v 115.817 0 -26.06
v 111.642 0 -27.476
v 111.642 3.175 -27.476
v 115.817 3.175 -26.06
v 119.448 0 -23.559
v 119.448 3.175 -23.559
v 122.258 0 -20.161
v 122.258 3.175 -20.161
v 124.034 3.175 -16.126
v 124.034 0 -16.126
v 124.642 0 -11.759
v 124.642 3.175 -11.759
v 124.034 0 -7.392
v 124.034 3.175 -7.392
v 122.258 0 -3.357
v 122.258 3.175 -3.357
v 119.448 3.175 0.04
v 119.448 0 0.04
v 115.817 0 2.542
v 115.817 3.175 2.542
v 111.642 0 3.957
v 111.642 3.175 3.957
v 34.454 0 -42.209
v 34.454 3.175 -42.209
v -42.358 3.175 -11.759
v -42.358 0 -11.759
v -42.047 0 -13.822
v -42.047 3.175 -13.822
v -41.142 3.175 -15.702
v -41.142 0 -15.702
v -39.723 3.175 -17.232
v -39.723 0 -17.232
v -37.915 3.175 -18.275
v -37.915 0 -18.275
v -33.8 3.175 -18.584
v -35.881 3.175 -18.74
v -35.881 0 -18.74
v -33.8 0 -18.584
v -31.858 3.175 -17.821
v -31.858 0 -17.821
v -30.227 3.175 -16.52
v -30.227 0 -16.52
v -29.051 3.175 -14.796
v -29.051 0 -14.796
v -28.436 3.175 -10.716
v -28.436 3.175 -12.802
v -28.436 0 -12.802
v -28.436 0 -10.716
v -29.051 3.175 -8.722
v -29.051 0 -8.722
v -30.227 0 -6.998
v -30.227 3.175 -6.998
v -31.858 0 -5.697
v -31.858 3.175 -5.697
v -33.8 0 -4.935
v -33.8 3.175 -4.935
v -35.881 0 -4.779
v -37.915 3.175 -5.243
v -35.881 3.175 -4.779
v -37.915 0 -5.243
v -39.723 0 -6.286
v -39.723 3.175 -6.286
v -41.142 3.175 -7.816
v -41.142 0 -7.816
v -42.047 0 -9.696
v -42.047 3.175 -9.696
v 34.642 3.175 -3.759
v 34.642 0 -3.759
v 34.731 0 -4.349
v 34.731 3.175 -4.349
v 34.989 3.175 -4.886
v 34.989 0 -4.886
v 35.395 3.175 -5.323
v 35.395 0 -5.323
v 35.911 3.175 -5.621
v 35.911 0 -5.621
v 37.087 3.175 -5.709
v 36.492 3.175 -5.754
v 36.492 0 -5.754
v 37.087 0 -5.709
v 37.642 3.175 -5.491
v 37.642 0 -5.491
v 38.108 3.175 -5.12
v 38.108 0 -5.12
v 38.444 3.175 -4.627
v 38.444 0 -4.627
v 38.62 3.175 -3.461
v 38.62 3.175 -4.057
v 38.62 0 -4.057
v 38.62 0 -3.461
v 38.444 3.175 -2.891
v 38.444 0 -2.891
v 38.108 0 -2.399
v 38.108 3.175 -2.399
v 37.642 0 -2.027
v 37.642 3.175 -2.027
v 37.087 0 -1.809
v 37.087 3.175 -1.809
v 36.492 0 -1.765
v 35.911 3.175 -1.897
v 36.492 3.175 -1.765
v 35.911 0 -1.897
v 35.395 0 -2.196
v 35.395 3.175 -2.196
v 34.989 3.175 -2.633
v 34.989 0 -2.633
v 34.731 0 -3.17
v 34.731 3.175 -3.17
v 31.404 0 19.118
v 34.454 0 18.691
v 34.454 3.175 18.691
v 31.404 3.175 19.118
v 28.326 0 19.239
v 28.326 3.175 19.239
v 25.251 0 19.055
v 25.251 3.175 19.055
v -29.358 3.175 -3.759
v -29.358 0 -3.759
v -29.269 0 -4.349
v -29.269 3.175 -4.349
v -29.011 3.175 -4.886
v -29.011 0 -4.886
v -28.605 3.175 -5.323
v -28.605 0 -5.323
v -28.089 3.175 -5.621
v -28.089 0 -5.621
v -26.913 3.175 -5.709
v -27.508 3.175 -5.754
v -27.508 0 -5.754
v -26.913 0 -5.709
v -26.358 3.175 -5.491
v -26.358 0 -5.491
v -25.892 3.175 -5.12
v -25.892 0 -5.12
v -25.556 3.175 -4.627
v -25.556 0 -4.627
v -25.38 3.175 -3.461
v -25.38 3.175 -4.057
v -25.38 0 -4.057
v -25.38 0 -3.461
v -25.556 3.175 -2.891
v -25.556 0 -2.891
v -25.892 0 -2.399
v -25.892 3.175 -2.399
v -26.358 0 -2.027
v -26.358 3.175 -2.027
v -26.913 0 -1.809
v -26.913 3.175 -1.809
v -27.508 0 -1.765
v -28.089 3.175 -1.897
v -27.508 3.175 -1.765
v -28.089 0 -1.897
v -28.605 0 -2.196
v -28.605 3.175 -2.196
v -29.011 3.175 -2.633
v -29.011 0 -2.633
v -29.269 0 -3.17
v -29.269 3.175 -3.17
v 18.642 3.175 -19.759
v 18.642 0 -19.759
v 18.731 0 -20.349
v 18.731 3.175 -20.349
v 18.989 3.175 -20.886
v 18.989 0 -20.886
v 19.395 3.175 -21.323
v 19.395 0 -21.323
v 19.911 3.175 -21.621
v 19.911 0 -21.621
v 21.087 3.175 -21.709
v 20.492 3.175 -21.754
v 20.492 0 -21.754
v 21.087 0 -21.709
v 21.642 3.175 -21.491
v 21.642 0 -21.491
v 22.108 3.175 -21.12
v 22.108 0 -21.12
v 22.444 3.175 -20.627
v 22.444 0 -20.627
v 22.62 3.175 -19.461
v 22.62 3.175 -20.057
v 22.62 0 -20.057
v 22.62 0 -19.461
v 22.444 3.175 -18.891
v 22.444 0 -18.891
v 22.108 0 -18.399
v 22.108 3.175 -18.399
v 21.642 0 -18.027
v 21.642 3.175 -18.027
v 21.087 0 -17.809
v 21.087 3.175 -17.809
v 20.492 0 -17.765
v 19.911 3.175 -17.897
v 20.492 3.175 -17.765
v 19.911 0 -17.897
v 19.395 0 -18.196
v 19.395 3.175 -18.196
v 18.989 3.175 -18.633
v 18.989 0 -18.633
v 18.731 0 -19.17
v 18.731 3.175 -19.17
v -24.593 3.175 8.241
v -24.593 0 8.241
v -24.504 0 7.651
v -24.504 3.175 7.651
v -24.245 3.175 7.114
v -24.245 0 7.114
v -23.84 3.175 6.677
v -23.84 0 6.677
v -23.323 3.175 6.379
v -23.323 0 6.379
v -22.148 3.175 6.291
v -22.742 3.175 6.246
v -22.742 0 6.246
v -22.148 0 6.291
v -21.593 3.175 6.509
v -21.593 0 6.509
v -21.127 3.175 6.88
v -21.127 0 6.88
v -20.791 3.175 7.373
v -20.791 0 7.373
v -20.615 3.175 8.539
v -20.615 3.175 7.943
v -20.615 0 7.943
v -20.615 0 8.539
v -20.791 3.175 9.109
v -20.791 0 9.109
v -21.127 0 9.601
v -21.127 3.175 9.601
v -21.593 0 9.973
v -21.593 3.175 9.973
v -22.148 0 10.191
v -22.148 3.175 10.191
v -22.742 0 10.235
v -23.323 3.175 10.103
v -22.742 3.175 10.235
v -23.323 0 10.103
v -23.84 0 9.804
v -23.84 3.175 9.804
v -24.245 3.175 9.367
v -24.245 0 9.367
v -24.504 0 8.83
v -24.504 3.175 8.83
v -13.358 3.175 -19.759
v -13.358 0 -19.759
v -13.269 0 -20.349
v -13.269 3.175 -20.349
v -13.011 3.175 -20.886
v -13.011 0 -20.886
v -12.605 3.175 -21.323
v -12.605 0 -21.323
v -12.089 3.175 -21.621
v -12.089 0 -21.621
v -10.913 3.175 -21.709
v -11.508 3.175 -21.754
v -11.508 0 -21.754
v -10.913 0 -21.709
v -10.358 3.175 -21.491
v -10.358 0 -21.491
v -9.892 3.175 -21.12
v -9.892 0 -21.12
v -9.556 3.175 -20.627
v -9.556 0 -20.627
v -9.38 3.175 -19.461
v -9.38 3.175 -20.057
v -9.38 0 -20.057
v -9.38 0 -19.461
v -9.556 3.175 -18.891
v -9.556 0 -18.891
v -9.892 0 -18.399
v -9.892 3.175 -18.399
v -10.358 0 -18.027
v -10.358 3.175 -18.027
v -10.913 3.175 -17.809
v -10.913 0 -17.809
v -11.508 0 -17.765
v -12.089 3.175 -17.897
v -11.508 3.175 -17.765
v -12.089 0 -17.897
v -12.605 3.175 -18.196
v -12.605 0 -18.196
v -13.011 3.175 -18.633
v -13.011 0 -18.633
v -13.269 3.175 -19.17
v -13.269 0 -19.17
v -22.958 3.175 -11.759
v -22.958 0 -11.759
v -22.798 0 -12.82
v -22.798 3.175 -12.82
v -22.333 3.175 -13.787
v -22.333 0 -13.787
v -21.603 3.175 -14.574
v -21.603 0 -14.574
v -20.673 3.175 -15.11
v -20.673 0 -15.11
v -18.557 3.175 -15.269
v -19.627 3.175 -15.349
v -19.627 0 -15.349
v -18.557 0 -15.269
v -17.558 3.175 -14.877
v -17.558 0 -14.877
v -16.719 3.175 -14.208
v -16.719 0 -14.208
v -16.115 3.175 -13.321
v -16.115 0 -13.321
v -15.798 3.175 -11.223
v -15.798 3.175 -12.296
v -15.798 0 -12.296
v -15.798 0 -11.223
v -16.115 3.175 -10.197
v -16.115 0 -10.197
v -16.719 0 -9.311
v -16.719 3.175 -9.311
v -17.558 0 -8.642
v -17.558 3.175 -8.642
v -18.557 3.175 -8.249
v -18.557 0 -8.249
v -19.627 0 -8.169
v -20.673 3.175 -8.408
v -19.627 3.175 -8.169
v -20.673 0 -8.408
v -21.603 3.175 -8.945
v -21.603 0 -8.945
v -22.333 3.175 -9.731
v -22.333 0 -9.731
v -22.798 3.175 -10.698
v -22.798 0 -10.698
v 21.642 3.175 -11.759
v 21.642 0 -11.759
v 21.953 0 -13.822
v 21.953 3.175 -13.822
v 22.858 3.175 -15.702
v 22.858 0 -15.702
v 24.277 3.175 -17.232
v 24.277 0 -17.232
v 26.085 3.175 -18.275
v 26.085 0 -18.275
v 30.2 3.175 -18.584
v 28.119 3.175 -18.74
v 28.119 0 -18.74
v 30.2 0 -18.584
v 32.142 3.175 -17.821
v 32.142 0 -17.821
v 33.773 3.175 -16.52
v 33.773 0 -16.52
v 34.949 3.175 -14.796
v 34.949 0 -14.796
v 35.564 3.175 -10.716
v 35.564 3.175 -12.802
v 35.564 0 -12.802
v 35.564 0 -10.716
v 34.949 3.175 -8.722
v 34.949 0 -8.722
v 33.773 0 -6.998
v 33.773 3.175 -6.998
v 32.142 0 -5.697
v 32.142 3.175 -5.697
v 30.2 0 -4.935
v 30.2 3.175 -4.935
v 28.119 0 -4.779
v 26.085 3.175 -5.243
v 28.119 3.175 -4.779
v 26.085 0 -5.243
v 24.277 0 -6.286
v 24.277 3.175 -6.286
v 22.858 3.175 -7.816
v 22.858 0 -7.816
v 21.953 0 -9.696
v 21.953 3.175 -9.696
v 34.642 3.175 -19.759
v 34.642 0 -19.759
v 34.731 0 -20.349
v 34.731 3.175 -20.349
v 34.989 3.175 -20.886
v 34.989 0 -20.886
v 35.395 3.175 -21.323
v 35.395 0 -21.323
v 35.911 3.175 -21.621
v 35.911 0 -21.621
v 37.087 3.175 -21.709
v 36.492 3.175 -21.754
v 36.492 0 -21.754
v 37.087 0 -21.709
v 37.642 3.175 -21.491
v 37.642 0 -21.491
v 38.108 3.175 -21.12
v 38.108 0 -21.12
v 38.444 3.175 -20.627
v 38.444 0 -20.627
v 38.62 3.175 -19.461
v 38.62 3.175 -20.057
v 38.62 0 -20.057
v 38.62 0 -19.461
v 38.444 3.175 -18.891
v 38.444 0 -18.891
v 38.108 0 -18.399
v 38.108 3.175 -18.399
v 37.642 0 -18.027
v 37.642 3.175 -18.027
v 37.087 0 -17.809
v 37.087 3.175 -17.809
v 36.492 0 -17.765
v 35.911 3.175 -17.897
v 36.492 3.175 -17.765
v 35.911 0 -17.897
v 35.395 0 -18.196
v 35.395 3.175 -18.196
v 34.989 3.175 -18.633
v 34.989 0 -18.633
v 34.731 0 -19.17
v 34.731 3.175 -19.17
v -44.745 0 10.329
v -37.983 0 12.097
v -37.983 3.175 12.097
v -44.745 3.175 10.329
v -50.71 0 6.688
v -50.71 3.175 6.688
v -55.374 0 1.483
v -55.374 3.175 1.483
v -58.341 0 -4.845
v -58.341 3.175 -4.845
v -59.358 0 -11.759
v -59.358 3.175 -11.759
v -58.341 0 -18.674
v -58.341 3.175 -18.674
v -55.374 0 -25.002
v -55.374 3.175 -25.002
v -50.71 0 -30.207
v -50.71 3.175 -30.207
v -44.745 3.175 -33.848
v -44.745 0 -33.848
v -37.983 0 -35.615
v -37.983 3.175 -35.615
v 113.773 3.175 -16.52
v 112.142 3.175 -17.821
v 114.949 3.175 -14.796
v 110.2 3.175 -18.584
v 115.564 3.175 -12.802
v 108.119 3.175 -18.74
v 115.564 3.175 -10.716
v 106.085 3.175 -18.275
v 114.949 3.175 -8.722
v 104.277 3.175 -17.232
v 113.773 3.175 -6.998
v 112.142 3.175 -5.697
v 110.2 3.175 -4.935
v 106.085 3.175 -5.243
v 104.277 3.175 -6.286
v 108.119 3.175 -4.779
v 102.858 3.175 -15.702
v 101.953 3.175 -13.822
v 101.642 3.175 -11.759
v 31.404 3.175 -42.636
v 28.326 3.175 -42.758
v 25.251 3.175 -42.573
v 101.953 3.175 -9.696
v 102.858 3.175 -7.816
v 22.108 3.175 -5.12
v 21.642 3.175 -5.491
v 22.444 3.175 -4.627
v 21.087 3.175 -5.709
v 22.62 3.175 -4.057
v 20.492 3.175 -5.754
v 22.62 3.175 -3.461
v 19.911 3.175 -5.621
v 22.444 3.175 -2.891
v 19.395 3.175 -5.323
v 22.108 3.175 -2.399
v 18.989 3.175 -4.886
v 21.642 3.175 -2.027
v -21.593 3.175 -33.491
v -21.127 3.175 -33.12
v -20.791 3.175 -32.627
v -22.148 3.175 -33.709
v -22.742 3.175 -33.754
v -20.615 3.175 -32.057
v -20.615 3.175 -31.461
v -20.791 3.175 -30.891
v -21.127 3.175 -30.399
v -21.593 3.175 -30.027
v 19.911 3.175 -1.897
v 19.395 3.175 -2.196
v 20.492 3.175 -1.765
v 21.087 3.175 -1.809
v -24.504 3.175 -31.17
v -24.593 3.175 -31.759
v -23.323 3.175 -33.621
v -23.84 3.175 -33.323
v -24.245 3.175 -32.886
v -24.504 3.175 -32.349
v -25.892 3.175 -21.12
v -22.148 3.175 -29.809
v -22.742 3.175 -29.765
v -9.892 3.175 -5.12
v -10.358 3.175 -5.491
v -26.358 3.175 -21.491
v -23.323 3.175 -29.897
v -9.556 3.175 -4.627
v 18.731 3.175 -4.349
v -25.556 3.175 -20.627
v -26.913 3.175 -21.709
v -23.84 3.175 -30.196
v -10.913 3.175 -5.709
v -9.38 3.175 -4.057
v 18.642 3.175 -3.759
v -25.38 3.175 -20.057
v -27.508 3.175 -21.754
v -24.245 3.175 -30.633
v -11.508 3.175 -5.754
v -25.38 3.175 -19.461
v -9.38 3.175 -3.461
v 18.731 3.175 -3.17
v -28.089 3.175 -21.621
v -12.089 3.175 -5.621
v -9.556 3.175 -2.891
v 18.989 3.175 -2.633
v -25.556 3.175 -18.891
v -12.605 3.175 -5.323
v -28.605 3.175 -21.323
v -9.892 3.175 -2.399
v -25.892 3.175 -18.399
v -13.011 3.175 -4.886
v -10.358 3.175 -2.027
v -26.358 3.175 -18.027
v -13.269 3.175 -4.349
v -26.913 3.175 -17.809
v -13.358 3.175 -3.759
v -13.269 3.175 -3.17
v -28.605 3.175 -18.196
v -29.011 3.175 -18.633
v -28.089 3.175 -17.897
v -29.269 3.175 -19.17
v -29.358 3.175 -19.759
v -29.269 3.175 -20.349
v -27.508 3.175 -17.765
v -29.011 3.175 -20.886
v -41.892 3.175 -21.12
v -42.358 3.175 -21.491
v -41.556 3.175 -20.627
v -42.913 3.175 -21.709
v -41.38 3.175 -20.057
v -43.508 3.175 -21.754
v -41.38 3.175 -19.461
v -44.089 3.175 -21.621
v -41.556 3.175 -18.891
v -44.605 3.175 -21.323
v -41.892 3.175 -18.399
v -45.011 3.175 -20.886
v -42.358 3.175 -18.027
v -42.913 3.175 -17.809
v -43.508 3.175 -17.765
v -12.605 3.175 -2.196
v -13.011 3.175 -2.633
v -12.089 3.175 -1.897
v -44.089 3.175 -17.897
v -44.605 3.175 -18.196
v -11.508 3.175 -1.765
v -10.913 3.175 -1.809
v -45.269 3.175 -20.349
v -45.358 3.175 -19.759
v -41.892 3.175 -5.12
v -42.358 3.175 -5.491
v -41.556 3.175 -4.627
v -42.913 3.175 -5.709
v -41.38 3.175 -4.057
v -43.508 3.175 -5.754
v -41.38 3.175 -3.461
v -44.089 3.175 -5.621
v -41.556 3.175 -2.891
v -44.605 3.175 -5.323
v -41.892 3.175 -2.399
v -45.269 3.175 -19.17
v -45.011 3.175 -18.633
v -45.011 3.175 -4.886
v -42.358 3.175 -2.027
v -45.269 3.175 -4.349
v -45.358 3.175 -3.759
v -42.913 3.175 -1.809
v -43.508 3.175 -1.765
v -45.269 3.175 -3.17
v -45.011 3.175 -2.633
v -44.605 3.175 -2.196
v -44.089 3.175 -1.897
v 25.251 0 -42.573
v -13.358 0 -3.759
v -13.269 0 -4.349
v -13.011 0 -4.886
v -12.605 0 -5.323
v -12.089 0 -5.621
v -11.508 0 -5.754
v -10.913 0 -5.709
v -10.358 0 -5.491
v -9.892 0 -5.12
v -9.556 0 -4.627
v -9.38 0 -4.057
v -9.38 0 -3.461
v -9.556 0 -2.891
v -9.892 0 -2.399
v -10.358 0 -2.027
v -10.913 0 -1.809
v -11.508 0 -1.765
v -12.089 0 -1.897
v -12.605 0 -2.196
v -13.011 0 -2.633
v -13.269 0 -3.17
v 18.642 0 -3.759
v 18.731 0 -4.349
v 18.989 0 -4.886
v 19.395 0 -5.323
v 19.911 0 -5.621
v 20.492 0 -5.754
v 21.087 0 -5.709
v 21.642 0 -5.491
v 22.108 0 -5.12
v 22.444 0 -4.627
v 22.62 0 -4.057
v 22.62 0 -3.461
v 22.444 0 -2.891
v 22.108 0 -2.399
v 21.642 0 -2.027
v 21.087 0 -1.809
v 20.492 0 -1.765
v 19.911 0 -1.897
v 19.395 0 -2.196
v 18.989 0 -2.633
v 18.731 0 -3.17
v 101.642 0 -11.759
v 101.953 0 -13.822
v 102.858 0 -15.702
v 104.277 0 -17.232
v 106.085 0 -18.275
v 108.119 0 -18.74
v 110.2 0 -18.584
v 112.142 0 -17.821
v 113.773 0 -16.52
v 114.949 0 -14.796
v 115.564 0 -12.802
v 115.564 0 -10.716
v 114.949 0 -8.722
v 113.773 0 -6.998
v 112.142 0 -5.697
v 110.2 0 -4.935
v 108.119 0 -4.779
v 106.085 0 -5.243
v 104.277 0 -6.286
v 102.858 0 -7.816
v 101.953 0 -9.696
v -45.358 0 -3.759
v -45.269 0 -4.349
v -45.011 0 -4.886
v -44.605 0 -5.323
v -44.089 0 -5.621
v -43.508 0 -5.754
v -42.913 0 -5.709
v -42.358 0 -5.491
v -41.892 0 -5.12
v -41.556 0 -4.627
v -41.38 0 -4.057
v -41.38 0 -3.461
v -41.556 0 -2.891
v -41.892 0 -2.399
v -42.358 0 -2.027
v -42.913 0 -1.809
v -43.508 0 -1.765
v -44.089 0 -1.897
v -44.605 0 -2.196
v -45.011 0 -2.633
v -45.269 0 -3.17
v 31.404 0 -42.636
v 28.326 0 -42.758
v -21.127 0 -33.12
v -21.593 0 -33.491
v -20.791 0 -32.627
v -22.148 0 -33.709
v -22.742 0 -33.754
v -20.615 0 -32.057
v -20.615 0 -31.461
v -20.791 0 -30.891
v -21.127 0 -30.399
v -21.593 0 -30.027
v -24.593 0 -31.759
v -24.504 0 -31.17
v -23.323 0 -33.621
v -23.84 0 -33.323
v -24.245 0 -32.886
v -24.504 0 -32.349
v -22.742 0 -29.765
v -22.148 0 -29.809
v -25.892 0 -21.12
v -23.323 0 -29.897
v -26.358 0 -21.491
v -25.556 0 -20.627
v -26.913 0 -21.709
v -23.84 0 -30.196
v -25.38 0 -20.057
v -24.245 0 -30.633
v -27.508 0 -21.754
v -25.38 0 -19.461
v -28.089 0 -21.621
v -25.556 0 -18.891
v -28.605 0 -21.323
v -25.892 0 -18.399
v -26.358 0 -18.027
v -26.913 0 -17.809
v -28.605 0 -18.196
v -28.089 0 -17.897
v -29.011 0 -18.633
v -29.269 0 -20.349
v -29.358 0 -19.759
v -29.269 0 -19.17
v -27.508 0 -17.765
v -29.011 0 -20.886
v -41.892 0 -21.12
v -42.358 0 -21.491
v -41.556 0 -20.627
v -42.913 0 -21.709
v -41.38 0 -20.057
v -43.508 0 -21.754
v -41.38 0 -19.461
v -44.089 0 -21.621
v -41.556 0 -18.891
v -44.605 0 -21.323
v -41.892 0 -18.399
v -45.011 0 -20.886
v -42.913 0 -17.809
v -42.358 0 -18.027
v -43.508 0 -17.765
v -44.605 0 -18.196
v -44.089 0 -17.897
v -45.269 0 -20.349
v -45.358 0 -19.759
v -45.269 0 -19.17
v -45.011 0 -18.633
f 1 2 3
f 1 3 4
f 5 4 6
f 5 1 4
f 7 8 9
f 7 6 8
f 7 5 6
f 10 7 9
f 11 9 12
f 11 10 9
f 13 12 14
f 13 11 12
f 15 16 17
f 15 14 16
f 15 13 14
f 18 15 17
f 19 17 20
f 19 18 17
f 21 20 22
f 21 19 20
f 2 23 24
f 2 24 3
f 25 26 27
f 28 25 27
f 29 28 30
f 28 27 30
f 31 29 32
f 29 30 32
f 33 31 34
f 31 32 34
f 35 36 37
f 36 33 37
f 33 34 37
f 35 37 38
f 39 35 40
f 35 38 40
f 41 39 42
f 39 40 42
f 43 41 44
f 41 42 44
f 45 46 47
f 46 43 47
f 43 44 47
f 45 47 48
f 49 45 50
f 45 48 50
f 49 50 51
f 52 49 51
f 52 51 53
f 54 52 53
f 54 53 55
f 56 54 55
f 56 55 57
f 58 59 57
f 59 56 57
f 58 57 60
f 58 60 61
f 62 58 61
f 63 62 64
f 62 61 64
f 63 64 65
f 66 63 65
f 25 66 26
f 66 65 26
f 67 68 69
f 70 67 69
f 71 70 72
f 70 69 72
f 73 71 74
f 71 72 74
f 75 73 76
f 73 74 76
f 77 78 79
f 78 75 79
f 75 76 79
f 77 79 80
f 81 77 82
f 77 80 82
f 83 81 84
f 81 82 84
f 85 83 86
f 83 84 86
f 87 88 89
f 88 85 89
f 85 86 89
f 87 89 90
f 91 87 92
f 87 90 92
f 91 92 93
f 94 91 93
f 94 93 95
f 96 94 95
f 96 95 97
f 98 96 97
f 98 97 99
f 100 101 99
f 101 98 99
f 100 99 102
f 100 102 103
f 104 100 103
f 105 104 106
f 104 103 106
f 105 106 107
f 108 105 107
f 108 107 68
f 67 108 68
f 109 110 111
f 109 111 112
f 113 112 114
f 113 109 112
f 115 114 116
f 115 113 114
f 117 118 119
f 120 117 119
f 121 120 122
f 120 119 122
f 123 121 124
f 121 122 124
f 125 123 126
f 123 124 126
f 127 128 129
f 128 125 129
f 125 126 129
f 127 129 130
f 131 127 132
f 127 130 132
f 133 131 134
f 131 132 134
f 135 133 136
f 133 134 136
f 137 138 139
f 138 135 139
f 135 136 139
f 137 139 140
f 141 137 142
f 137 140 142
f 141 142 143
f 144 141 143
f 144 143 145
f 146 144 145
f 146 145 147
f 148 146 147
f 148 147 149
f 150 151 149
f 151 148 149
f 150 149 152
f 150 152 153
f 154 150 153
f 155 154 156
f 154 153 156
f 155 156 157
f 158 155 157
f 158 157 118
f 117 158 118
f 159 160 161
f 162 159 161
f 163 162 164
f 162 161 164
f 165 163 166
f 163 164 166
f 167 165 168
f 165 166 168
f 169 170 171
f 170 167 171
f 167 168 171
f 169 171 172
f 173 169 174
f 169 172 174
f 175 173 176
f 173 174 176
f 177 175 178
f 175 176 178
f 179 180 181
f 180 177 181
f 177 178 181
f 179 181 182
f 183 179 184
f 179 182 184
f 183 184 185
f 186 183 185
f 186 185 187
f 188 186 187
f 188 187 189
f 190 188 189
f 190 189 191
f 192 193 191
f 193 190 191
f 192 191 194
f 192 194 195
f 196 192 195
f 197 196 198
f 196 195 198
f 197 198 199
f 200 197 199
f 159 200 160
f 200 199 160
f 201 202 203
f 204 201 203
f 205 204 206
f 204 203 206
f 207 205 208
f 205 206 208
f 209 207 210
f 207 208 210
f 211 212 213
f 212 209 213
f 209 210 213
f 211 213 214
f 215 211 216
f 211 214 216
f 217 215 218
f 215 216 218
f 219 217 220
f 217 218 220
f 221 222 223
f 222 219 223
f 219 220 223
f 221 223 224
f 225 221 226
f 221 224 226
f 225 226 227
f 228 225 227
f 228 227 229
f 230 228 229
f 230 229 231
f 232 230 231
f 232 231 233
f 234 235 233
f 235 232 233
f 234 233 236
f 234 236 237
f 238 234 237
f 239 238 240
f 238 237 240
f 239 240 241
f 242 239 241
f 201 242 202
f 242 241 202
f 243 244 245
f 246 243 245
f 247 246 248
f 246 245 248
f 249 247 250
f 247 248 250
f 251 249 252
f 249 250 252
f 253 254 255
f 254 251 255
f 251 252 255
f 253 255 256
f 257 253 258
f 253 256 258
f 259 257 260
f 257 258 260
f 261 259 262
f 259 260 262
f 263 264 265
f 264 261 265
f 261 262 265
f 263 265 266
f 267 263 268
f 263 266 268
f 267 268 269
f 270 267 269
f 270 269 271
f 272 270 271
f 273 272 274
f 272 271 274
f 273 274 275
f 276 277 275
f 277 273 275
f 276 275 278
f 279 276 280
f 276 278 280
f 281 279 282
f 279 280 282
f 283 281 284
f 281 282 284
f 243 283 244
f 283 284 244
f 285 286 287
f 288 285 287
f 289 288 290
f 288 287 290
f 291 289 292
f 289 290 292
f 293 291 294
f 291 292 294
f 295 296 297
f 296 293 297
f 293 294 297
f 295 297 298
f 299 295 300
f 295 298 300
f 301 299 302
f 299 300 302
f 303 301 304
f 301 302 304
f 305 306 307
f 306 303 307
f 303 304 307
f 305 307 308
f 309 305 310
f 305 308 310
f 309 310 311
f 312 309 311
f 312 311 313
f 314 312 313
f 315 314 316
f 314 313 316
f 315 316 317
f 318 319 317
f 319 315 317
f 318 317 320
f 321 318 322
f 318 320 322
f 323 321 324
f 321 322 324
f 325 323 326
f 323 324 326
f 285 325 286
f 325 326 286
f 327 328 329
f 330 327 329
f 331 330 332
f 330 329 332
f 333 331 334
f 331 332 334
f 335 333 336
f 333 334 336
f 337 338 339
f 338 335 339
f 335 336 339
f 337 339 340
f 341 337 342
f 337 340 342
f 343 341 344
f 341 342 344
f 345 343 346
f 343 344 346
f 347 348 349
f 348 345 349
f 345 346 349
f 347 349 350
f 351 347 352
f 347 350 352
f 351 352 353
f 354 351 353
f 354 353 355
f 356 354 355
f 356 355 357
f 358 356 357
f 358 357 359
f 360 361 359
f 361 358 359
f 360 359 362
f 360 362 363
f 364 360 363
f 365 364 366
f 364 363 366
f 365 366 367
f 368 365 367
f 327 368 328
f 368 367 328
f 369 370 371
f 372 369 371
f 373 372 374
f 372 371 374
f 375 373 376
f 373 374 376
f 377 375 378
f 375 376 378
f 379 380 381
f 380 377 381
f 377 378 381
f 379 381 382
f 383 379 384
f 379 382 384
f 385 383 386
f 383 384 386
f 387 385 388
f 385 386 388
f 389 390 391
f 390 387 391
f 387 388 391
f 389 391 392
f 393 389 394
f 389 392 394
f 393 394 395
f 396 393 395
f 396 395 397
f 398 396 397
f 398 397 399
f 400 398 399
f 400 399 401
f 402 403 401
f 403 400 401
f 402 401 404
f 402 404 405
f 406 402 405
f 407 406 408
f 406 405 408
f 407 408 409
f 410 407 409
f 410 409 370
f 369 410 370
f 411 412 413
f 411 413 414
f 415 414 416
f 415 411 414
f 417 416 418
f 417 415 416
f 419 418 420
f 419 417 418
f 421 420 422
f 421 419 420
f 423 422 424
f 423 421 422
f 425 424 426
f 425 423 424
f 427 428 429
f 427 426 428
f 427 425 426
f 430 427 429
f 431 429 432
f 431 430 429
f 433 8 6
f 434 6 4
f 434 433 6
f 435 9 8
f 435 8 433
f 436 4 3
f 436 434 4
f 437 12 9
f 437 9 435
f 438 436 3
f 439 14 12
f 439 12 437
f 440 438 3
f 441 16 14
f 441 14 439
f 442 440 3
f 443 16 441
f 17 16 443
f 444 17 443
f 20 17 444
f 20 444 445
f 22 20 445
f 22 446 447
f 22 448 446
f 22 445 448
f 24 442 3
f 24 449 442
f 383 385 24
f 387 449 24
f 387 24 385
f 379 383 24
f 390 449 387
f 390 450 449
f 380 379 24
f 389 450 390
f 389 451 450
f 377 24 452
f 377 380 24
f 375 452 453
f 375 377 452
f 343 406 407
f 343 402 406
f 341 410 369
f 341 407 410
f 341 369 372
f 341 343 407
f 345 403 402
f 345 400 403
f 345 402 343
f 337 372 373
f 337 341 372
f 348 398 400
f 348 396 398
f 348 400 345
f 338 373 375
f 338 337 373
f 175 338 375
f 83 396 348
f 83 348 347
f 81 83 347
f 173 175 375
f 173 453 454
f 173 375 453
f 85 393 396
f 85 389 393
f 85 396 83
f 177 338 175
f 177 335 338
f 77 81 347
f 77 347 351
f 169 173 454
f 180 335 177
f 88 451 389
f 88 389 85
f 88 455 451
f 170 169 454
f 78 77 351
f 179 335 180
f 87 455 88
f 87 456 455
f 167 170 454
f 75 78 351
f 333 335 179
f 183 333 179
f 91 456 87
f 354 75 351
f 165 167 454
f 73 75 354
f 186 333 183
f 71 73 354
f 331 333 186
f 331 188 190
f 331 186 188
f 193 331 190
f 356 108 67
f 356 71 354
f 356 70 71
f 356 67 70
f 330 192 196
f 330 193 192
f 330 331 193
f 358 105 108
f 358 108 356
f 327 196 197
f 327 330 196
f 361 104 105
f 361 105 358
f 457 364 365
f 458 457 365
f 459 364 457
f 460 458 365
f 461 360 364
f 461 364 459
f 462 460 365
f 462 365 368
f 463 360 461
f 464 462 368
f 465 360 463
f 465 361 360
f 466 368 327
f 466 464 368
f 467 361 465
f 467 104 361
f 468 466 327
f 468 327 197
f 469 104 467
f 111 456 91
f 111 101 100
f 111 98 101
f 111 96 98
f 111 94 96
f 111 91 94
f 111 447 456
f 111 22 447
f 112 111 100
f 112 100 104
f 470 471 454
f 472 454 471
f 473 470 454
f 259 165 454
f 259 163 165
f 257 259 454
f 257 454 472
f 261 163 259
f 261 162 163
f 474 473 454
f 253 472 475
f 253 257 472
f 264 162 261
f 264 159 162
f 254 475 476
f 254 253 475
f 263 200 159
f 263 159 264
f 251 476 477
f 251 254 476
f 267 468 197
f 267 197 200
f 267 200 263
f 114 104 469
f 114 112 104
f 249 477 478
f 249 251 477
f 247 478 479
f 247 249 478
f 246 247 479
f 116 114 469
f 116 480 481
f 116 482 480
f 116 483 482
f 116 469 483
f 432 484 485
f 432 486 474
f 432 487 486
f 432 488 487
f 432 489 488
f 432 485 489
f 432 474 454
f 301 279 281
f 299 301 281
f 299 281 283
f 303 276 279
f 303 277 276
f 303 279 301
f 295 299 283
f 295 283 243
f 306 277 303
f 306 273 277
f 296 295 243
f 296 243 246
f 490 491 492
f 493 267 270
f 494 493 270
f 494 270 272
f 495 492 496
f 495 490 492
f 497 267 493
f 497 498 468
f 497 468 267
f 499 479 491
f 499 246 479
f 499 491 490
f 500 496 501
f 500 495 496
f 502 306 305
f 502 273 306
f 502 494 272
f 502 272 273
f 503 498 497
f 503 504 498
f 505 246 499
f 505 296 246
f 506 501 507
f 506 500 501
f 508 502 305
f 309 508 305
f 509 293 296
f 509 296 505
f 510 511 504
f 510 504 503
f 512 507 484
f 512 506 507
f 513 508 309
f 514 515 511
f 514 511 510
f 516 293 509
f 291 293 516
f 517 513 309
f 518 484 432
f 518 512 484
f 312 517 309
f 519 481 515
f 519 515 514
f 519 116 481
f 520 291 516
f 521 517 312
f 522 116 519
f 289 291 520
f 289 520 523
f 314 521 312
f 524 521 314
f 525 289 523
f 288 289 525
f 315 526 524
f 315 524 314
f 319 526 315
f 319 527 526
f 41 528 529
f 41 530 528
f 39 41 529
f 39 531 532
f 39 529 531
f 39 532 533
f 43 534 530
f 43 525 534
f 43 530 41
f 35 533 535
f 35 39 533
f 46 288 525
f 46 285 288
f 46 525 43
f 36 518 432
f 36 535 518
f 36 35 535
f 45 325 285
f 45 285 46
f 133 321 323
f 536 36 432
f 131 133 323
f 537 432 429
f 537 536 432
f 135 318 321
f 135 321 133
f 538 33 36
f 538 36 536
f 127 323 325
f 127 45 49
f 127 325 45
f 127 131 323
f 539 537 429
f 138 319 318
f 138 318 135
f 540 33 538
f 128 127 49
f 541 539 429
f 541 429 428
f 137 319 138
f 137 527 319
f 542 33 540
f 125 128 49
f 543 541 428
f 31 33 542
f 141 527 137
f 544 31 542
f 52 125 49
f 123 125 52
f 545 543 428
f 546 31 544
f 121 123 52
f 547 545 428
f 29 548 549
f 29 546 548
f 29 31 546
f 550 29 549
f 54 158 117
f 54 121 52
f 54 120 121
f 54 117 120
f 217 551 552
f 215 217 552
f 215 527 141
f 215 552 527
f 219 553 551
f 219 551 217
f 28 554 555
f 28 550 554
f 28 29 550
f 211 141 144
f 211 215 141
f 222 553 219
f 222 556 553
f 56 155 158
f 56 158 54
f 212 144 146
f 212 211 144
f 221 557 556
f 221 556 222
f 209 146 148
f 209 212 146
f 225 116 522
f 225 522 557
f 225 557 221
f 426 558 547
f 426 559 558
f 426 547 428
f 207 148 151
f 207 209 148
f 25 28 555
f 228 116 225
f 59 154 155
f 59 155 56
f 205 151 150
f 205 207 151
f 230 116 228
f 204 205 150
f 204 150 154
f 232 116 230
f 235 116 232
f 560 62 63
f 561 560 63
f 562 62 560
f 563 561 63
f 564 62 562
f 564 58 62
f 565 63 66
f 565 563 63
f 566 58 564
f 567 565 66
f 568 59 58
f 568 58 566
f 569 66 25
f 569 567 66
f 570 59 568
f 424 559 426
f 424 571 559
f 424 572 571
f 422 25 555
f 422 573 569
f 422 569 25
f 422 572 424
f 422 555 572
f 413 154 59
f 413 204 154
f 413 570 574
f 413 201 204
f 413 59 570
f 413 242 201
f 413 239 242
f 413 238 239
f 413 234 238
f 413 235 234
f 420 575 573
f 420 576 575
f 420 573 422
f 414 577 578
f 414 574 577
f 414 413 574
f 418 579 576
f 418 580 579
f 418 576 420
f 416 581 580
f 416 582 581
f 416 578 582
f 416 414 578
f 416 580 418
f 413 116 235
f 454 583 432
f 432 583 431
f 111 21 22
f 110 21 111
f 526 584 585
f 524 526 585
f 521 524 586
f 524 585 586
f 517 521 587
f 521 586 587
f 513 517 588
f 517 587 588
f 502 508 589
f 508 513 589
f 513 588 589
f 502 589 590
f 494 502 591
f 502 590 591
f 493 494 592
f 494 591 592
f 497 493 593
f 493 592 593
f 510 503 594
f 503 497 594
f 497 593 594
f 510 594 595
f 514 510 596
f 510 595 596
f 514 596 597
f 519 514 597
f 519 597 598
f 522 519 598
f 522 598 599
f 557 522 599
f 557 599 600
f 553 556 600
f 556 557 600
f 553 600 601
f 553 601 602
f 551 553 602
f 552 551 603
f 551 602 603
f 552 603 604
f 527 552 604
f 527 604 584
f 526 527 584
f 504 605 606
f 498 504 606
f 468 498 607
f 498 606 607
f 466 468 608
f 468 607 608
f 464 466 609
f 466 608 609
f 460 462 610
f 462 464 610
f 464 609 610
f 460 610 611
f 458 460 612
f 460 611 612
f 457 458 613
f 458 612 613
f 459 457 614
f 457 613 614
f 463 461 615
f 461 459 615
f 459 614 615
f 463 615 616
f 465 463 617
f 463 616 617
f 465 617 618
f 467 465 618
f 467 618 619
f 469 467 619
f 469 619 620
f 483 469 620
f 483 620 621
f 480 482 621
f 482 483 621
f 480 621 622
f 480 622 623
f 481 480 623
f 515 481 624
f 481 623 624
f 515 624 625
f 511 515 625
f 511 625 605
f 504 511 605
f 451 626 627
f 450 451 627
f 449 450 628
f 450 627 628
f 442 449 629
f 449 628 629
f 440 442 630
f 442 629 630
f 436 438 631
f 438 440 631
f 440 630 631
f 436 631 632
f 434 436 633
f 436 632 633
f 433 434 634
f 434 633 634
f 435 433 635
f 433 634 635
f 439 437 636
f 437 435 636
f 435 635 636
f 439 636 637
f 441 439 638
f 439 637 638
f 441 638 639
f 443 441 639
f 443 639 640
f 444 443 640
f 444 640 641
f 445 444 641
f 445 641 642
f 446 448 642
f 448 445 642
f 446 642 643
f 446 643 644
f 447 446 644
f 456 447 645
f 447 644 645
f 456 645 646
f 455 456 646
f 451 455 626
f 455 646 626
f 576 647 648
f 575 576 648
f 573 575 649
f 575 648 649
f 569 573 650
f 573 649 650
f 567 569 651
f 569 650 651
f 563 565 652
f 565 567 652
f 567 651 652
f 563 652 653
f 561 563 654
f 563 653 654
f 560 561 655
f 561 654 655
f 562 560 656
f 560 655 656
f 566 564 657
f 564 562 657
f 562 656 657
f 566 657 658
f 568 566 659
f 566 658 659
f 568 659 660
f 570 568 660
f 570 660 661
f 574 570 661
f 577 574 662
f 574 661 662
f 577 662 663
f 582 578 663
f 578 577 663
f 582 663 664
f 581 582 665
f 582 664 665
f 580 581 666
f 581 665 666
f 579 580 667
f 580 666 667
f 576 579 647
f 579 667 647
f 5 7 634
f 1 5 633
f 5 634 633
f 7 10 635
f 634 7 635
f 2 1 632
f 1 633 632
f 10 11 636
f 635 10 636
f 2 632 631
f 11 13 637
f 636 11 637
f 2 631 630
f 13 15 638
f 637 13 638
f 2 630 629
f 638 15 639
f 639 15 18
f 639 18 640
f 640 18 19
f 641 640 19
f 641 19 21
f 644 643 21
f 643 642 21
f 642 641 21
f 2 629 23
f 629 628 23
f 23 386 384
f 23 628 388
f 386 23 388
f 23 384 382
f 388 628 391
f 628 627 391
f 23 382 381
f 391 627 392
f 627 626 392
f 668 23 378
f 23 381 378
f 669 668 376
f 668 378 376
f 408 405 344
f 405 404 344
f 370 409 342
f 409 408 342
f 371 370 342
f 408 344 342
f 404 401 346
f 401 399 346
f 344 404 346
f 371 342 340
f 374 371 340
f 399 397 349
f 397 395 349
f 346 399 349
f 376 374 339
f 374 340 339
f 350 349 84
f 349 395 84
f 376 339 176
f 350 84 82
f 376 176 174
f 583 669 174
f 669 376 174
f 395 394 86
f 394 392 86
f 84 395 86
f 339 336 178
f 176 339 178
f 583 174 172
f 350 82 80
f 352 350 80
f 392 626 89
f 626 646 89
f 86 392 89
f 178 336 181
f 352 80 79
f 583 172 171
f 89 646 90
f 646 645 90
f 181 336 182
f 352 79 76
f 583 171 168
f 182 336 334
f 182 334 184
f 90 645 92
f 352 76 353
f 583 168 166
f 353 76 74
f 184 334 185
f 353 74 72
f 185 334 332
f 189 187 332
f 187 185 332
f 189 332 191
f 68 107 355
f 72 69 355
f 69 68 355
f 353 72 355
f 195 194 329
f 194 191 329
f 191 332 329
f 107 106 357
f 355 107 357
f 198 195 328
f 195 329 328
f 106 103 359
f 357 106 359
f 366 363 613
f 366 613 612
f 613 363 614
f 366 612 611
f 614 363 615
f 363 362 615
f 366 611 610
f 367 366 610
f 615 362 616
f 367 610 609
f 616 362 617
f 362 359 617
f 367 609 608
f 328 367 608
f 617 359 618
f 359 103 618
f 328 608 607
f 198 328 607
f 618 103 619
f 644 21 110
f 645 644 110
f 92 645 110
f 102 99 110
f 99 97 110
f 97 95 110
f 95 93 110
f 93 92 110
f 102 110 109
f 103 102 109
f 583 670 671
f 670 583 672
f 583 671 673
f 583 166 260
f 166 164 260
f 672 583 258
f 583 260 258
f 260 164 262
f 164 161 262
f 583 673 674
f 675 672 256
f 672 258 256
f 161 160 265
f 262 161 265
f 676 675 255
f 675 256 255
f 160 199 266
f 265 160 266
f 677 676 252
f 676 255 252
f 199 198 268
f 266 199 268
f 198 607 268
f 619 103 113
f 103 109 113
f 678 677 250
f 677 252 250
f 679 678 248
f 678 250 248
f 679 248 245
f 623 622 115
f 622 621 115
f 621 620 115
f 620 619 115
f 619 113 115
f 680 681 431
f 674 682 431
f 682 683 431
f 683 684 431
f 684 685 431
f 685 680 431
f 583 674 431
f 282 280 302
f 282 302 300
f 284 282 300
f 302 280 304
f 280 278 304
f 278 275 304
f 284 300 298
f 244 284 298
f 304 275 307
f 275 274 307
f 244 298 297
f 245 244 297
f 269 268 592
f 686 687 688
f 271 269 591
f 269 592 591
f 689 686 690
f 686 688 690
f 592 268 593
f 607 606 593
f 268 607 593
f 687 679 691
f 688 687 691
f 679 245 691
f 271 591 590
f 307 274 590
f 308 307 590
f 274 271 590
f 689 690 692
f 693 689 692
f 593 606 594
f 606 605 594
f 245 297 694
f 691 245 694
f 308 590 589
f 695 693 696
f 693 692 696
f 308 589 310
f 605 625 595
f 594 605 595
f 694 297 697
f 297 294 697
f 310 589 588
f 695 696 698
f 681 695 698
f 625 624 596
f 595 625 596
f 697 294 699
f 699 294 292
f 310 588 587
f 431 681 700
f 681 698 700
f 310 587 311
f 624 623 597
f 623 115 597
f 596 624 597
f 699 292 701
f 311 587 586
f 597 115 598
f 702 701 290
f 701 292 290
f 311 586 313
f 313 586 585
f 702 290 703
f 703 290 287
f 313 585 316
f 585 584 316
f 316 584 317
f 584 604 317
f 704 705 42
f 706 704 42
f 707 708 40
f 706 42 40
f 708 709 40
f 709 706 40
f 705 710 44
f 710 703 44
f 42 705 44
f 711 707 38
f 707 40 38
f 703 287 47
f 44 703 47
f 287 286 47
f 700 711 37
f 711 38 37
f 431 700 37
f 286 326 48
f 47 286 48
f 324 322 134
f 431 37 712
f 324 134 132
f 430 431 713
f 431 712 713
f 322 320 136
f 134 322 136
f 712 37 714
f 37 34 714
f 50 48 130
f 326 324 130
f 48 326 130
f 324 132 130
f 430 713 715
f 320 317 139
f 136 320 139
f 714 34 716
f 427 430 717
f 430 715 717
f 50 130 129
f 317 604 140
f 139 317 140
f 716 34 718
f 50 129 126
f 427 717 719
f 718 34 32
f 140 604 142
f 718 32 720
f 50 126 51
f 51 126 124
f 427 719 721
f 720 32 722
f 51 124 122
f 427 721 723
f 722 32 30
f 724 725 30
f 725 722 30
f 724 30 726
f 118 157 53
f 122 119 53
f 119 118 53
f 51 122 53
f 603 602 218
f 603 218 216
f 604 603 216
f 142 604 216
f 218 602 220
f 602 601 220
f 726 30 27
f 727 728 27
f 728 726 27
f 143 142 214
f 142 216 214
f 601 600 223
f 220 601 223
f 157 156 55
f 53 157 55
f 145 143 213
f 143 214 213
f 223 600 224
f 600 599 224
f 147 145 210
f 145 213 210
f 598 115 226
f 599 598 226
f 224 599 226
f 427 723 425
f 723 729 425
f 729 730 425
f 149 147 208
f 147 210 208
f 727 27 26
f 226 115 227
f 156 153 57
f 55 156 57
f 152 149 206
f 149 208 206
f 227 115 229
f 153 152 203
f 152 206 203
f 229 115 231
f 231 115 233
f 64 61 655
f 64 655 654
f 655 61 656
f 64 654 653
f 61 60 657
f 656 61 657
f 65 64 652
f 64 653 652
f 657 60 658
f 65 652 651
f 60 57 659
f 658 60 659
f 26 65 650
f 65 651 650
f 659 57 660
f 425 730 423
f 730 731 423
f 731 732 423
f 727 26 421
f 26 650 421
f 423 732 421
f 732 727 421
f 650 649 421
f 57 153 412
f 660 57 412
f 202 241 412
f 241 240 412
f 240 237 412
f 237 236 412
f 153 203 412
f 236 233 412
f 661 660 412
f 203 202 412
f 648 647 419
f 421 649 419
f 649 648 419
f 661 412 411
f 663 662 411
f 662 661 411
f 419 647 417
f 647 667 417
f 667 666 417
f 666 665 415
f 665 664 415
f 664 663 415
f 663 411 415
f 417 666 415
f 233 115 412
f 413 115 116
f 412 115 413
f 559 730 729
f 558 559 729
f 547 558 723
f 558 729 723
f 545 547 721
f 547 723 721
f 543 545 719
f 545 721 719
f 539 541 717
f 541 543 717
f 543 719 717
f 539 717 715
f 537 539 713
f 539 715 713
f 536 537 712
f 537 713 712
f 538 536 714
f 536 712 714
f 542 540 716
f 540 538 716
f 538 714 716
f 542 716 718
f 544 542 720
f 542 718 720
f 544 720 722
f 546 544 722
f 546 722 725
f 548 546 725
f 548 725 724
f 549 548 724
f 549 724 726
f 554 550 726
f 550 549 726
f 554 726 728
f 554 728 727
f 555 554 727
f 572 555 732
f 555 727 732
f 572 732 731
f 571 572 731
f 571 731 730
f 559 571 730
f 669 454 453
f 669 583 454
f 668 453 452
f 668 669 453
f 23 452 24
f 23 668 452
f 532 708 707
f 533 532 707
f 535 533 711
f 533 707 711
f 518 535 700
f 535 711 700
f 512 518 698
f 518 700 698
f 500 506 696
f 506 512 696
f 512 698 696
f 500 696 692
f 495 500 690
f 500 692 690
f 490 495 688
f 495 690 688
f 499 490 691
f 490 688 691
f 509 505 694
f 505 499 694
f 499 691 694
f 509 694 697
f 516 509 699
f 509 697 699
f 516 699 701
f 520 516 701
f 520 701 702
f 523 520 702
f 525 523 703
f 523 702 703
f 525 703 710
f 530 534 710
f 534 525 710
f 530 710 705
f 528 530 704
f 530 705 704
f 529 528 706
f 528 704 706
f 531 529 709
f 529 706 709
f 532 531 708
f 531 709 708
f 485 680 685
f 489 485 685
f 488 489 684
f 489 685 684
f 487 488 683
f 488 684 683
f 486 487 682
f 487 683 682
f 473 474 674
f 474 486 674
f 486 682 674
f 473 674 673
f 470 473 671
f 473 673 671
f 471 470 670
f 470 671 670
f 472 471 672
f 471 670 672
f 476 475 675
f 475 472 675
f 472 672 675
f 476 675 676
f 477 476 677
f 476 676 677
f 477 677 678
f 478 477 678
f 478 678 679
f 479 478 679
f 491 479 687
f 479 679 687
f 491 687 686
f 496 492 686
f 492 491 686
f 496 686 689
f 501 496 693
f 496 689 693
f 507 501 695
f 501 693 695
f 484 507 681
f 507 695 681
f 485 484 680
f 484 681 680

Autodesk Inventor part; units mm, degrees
ref_plane "YZ Plane" through (0, 0, 0) normal (1, 0, 0) x (0, 1, 0)
ref_plane "XZ Plane" through (0, 0, 0) normal (0, 1, 0) x (-1, 0, 0)
ref_plane "XY Plane" through (0, 0, 0) normal (0, 0, 1) x (1, 0, 0)
sketch "Sketch1" plane through (0, 0, 0) normal (0, 1, 0) x (-1, 0, 0)
  line L0 (-28.6419, -11.7592) -> (-388.4279, -11.7592) construction
  arc A0 (-111.6419, 3.957) -> (-111.6419, -27.4755) centre (-108.6419, -11.7592) ccw
  arc A1 (37.9831, -35.6153) -> (37.9831, 12.0968) centre (35.3581, -11.7592) ccw
  line L1 (-25.2513, -42.5733) -> (37.9831, -35.6153)
  line L2 (-25.2513, 19.0548) -> (37.9831, 12.0968)
  line L3 (-34.4544, -42.2094) -> (-111.6419, -27.4755)
  line L4 (-111.6419, 3.957) -> (-34.4544, 18.691)
  arc A2 (-25.2513, 19.0548) -> (-34.4544, 18.691) centre (-28.6419, -11.7592) ccw
  arc A3 (-34.4544, -42.2094) -> (-25.2513, -42.5733) centre (-28.6419, -11.7592) ccw
  circle A4 centre (-108.6419, -11.7592) radius 7
  circle A5 centre (35.3581, -11.7592) radius 7
  circle A6 centre (-28.6419, -11.7592) radius 7
  circle A7 centre (27.3581, -3.7592) radius 2
  circle A8 centre (27.3581, -19.7592) radius 2
  circle A9 centre (43.3581, -19.7592) radius 2
  circle A10 centre (43.3581, -3.7592) radius 2
  circle A11 centre (35.3581, -11.7592) radius 11.3137 construction
  circle A12 centre (-108.6419, -11.7592) radius 43 construction
  circle A13 centre (-28.6419, -11.7592) radius 55 construction
  circle A14 centre (22.5928, -31.7592) radius 2
  circle A15 centre (22.5928, 8.2408) radius 2
  circle A16 centre (-36.6419, -19.7592) radius 2
  circle A17 centre (-20.6419, -19.7592) radius 2
  circle A18 centre (-20.6419, -3.7592) radius 2
  circle A19 centre (-36.6419, -3.7592) radius 2
  circle A20 centre (11.3581, -19.7592) radius 2
  circle A21 centre (11.3581, -3.7592) radius 2
  circle A22 centre (19.3581, -11.7592) radius 3.6
  dimension "d21" = 110
  dimension "d3" = 32
  dimension "d4" = 80
  dimension "d5" = 48
  dimension "d6" = 64
  dimension "d7" = 14
  dimension "d8" = 14
  dimension "d9" = 14
  dimension "d12" = 4
  dimension "d15" = 360
  dimension "d19" = 86
  dimension "d22" = 4
  dimension "d23" = 20
  dimension "d24" = 8
  dimension "d25" = 8
  dimension "d26" = 4
  dimension "d29" = 360
  dimension "d31" = 8
  dimension "d32" = 4
  dimension "d33" = 16
  dimension "d34" = 7.2
  dimension "d35" = 8
extrude "Extrusion1" add sketch "Sketch1" along normal blind 3.175
properties part number "bean" material "Aluminum 6061"
